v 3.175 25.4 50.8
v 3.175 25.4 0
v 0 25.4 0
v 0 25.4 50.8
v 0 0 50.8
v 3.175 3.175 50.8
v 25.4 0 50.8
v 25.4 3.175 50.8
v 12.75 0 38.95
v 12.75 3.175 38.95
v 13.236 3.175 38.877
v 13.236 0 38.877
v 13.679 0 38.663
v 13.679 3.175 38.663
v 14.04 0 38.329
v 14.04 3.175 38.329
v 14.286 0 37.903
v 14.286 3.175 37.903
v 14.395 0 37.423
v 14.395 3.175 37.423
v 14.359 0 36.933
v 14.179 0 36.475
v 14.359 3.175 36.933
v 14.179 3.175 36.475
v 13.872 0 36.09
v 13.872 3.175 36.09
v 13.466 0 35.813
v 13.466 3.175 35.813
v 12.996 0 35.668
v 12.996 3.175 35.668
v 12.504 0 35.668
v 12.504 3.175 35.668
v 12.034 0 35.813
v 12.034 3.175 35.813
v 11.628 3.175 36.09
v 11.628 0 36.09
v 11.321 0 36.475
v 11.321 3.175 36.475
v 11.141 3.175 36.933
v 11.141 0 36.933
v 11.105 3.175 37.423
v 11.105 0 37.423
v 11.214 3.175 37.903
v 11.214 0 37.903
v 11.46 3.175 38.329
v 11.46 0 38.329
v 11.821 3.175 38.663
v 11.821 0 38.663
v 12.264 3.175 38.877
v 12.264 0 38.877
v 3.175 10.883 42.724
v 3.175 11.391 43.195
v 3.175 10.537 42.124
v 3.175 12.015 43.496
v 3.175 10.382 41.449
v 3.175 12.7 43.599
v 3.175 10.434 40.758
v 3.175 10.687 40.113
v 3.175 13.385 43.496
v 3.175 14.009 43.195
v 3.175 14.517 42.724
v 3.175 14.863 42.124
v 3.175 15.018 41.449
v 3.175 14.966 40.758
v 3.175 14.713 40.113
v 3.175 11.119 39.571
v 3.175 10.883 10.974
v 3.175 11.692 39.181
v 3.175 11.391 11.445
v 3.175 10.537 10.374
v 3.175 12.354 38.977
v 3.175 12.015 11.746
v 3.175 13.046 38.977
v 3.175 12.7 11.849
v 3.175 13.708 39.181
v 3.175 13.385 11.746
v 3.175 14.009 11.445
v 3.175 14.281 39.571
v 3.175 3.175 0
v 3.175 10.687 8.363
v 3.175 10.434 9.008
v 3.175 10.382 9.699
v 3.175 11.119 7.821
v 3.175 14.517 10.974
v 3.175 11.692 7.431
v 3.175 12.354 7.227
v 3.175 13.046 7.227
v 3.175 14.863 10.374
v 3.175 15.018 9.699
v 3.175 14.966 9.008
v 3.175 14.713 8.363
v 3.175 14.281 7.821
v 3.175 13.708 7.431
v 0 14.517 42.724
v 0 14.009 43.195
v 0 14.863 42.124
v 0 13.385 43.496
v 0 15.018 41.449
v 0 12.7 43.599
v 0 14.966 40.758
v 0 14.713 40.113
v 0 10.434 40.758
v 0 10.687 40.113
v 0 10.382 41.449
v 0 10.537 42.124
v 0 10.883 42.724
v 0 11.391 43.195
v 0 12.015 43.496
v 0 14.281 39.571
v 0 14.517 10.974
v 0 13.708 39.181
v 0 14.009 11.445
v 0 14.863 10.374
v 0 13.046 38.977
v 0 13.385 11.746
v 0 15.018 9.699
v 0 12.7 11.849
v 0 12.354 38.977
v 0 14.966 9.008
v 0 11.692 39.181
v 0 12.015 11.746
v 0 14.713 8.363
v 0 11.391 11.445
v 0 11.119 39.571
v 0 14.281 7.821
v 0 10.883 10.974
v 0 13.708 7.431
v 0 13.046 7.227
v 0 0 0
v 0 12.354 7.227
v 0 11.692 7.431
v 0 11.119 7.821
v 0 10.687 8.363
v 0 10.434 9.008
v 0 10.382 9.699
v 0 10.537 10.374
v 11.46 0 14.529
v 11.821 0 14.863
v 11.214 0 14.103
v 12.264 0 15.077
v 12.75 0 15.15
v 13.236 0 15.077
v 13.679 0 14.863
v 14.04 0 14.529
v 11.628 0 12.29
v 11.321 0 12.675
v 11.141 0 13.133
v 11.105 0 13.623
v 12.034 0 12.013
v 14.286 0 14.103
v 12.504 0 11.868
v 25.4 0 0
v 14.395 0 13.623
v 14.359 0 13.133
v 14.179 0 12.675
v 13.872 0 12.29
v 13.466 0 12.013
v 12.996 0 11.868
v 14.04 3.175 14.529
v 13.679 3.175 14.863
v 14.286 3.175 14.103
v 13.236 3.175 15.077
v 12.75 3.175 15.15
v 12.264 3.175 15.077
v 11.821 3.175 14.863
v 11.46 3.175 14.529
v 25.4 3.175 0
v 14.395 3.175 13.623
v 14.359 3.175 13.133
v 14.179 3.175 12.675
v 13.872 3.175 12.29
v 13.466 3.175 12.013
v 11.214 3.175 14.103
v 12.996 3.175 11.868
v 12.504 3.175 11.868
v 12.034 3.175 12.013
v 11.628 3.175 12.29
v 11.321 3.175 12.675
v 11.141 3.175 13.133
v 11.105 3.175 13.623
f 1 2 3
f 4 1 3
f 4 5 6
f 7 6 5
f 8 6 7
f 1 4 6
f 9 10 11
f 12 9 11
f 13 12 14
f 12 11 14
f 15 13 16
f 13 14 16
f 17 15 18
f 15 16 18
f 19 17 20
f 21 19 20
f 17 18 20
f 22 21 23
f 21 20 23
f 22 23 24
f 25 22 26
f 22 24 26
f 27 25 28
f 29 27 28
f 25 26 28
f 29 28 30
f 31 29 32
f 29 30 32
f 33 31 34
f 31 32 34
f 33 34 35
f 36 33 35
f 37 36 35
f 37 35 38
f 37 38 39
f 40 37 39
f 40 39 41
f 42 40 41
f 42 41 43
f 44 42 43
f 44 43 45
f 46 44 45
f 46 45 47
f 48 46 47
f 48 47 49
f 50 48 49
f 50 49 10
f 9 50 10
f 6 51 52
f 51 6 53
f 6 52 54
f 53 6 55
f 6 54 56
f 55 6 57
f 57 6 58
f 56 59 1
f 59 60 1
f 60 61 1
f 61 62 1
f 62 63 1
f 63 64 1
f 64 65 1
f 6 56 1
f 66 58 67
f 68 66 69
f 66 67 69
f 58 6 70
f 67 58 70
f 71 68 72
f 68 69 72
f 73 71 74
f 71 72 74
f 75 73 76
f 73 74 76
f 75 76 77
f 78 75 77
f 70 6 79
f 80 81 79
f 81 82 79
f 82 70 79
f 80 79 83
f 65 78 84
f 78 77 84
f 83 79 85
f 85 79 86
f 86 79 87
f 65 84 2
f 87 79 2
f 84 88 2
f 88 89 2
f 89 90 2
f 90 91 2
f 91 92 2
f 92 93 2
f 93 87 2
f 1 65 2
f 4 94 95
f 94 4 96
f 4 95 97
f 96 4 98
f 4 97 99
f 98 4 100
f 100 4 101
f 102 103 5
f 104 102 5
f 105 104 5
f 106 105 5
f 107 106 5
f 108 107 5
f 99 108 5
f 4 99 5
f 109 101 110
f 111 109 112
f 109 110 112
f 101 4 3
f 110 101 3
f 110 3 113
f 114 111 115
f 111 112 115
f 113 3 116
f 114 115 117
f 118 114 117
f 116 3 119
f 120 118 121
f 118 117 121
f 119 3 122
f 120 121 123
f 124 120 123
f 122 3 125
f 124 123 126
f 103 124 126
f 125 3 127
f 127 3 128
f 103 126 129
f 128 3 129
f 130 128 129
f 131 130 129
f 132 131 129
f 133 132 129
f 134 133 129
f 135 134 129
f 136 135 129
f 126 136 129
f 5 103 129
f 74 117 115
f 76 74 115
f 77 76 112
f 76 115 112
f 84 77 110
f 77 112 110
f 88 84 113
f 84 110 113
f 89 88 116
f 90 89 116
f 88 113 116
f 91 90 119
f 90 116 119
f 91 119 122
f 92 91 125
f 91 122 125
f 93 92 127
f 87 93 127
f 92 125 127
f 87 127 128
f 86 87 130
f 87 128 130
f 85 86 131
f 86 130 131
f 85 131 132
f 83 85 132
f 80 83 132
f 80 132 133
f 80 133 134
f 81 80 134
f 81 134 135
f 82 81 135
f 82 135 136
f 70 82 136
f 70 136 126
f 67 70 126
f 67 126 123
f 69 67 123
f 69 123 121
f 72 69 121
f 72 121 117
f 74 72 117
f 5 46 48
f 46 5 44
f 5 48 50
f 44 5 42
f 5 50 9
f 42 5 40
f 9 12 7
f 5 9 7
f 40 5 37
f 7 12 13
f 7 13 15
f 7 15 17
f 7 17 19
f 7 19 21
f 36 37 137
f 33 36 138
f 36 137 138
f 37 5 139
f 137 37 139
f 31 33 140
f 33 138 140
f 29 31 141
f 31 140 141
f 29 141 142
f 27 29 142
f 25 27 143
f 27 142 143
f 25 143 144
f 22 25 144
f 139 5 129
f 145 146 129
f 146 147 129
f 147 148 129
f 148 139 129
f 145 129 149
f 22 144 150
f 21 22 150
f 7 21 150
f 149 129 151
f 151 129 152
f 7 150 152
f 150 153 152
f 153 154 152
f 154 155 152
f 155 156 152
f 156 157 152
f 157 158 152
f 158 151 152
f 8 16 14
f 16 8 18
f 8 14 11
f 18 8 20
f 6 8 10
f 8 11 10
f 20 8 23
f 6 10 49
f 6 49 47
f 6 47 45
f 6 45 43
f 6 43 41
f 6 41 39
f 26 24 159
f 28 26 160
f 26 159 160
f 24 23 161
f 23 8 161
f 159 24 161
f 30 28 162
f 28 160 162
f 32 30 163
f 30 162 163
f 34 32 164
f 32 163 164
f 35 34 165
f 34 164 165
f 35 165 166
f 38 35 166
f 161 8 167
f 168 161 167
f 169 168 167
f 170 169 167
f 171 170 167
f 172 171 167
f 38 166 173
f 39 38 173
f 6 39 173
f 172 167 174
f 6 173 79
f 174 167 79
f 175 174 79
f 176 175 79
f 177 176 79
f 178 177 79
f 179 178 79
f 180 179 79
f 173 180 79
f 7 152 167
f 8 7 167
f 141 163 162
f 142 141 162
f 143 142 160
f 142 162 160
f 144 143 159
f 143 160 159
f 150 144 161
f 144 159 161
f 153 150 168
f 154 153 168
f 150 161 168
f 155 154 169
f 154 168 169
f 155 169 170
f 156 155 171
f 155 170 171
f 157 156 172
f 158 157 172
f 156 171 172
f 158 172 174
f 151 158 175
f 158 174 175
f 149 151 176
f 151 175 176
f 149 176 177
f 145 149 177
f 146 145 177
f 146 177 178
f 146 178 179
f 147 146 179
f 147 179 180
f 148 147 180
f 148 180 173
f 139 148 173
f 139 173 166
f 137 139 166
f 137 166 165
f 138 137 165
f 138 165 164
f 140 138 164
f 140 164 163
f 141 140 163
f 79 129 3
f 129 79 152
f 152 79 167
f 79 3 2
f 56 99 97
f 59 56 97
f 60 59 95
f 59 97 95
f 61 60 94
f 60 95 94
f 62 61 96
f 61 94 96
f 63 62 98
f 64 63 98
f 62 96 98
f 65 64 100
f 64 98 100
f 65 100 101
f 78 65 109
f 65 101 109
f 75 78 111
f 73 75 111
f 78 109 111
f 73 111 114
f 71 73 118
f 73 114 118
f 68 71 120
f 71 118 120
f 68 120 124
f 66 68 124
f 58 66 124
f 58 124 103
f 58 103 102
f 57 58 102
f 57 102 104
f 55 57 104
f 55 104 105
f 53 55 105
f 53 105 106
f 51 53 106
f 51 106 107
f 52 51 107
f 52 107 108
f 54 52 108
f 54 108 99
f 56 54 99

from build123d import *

# Parameters (mm, degrees)
BOSS_EXTRUDE1_DEPTH = 50.8
SKETCH2_R           = 1.65
CUT_EXTRUDE1_DEPTH  = 61.989758362
SKETCH3_R           = 2.3241
CUT_EXTRUDE2_DEPTH  = 63.217039467


with BuildPart() as part:
    # Sketch1 → Boss-Extrude1 (new body)
    with BuildSketch(Plane.XY):
        Polygon((0, 25.4), (0, 0), (25.4, 0), (25.4, 3.175), (3.175, 3.175), (3.175, 25.4), align=None)
    extrude(amount=BOSS_EXTRUDE1_DEPTH)

    # Sketch2 → Cut-Extrude1 (cut, through all)
    with BuildSketch(Plane(origin=(0, 3.175, 0), x_dir=(1, 0, 0), z_dir=(0, 1, 0))):
        with Locations(Location((12.75, -13.499999988, 0), (0, 0, 270))):
            Circle(SKETCH2_R)
        with Locations(Location((12.75, -37.299999988, 0), (0, 0, 270))):
            Circle(SKETCH2_R)
    extrude(amount=-CUT_EXTRUDE1_DEPTH, mode=Mode.SUBTRACT)

    # Sketch3 → Cut-Extrude2 (cut, through all)
    with BuildSketch(Plane.ZY):
        with Locations((9.525, 12.7)):
            Circle(SKETCH3_R)
        with Locations((41.275, 12.7)):
            Circle(SKETCH3_R)
    extrude(amount=-CUT_EXTRUDE2_DEPTH, mode=Mode.SUBTRACT)


solid = part.part
